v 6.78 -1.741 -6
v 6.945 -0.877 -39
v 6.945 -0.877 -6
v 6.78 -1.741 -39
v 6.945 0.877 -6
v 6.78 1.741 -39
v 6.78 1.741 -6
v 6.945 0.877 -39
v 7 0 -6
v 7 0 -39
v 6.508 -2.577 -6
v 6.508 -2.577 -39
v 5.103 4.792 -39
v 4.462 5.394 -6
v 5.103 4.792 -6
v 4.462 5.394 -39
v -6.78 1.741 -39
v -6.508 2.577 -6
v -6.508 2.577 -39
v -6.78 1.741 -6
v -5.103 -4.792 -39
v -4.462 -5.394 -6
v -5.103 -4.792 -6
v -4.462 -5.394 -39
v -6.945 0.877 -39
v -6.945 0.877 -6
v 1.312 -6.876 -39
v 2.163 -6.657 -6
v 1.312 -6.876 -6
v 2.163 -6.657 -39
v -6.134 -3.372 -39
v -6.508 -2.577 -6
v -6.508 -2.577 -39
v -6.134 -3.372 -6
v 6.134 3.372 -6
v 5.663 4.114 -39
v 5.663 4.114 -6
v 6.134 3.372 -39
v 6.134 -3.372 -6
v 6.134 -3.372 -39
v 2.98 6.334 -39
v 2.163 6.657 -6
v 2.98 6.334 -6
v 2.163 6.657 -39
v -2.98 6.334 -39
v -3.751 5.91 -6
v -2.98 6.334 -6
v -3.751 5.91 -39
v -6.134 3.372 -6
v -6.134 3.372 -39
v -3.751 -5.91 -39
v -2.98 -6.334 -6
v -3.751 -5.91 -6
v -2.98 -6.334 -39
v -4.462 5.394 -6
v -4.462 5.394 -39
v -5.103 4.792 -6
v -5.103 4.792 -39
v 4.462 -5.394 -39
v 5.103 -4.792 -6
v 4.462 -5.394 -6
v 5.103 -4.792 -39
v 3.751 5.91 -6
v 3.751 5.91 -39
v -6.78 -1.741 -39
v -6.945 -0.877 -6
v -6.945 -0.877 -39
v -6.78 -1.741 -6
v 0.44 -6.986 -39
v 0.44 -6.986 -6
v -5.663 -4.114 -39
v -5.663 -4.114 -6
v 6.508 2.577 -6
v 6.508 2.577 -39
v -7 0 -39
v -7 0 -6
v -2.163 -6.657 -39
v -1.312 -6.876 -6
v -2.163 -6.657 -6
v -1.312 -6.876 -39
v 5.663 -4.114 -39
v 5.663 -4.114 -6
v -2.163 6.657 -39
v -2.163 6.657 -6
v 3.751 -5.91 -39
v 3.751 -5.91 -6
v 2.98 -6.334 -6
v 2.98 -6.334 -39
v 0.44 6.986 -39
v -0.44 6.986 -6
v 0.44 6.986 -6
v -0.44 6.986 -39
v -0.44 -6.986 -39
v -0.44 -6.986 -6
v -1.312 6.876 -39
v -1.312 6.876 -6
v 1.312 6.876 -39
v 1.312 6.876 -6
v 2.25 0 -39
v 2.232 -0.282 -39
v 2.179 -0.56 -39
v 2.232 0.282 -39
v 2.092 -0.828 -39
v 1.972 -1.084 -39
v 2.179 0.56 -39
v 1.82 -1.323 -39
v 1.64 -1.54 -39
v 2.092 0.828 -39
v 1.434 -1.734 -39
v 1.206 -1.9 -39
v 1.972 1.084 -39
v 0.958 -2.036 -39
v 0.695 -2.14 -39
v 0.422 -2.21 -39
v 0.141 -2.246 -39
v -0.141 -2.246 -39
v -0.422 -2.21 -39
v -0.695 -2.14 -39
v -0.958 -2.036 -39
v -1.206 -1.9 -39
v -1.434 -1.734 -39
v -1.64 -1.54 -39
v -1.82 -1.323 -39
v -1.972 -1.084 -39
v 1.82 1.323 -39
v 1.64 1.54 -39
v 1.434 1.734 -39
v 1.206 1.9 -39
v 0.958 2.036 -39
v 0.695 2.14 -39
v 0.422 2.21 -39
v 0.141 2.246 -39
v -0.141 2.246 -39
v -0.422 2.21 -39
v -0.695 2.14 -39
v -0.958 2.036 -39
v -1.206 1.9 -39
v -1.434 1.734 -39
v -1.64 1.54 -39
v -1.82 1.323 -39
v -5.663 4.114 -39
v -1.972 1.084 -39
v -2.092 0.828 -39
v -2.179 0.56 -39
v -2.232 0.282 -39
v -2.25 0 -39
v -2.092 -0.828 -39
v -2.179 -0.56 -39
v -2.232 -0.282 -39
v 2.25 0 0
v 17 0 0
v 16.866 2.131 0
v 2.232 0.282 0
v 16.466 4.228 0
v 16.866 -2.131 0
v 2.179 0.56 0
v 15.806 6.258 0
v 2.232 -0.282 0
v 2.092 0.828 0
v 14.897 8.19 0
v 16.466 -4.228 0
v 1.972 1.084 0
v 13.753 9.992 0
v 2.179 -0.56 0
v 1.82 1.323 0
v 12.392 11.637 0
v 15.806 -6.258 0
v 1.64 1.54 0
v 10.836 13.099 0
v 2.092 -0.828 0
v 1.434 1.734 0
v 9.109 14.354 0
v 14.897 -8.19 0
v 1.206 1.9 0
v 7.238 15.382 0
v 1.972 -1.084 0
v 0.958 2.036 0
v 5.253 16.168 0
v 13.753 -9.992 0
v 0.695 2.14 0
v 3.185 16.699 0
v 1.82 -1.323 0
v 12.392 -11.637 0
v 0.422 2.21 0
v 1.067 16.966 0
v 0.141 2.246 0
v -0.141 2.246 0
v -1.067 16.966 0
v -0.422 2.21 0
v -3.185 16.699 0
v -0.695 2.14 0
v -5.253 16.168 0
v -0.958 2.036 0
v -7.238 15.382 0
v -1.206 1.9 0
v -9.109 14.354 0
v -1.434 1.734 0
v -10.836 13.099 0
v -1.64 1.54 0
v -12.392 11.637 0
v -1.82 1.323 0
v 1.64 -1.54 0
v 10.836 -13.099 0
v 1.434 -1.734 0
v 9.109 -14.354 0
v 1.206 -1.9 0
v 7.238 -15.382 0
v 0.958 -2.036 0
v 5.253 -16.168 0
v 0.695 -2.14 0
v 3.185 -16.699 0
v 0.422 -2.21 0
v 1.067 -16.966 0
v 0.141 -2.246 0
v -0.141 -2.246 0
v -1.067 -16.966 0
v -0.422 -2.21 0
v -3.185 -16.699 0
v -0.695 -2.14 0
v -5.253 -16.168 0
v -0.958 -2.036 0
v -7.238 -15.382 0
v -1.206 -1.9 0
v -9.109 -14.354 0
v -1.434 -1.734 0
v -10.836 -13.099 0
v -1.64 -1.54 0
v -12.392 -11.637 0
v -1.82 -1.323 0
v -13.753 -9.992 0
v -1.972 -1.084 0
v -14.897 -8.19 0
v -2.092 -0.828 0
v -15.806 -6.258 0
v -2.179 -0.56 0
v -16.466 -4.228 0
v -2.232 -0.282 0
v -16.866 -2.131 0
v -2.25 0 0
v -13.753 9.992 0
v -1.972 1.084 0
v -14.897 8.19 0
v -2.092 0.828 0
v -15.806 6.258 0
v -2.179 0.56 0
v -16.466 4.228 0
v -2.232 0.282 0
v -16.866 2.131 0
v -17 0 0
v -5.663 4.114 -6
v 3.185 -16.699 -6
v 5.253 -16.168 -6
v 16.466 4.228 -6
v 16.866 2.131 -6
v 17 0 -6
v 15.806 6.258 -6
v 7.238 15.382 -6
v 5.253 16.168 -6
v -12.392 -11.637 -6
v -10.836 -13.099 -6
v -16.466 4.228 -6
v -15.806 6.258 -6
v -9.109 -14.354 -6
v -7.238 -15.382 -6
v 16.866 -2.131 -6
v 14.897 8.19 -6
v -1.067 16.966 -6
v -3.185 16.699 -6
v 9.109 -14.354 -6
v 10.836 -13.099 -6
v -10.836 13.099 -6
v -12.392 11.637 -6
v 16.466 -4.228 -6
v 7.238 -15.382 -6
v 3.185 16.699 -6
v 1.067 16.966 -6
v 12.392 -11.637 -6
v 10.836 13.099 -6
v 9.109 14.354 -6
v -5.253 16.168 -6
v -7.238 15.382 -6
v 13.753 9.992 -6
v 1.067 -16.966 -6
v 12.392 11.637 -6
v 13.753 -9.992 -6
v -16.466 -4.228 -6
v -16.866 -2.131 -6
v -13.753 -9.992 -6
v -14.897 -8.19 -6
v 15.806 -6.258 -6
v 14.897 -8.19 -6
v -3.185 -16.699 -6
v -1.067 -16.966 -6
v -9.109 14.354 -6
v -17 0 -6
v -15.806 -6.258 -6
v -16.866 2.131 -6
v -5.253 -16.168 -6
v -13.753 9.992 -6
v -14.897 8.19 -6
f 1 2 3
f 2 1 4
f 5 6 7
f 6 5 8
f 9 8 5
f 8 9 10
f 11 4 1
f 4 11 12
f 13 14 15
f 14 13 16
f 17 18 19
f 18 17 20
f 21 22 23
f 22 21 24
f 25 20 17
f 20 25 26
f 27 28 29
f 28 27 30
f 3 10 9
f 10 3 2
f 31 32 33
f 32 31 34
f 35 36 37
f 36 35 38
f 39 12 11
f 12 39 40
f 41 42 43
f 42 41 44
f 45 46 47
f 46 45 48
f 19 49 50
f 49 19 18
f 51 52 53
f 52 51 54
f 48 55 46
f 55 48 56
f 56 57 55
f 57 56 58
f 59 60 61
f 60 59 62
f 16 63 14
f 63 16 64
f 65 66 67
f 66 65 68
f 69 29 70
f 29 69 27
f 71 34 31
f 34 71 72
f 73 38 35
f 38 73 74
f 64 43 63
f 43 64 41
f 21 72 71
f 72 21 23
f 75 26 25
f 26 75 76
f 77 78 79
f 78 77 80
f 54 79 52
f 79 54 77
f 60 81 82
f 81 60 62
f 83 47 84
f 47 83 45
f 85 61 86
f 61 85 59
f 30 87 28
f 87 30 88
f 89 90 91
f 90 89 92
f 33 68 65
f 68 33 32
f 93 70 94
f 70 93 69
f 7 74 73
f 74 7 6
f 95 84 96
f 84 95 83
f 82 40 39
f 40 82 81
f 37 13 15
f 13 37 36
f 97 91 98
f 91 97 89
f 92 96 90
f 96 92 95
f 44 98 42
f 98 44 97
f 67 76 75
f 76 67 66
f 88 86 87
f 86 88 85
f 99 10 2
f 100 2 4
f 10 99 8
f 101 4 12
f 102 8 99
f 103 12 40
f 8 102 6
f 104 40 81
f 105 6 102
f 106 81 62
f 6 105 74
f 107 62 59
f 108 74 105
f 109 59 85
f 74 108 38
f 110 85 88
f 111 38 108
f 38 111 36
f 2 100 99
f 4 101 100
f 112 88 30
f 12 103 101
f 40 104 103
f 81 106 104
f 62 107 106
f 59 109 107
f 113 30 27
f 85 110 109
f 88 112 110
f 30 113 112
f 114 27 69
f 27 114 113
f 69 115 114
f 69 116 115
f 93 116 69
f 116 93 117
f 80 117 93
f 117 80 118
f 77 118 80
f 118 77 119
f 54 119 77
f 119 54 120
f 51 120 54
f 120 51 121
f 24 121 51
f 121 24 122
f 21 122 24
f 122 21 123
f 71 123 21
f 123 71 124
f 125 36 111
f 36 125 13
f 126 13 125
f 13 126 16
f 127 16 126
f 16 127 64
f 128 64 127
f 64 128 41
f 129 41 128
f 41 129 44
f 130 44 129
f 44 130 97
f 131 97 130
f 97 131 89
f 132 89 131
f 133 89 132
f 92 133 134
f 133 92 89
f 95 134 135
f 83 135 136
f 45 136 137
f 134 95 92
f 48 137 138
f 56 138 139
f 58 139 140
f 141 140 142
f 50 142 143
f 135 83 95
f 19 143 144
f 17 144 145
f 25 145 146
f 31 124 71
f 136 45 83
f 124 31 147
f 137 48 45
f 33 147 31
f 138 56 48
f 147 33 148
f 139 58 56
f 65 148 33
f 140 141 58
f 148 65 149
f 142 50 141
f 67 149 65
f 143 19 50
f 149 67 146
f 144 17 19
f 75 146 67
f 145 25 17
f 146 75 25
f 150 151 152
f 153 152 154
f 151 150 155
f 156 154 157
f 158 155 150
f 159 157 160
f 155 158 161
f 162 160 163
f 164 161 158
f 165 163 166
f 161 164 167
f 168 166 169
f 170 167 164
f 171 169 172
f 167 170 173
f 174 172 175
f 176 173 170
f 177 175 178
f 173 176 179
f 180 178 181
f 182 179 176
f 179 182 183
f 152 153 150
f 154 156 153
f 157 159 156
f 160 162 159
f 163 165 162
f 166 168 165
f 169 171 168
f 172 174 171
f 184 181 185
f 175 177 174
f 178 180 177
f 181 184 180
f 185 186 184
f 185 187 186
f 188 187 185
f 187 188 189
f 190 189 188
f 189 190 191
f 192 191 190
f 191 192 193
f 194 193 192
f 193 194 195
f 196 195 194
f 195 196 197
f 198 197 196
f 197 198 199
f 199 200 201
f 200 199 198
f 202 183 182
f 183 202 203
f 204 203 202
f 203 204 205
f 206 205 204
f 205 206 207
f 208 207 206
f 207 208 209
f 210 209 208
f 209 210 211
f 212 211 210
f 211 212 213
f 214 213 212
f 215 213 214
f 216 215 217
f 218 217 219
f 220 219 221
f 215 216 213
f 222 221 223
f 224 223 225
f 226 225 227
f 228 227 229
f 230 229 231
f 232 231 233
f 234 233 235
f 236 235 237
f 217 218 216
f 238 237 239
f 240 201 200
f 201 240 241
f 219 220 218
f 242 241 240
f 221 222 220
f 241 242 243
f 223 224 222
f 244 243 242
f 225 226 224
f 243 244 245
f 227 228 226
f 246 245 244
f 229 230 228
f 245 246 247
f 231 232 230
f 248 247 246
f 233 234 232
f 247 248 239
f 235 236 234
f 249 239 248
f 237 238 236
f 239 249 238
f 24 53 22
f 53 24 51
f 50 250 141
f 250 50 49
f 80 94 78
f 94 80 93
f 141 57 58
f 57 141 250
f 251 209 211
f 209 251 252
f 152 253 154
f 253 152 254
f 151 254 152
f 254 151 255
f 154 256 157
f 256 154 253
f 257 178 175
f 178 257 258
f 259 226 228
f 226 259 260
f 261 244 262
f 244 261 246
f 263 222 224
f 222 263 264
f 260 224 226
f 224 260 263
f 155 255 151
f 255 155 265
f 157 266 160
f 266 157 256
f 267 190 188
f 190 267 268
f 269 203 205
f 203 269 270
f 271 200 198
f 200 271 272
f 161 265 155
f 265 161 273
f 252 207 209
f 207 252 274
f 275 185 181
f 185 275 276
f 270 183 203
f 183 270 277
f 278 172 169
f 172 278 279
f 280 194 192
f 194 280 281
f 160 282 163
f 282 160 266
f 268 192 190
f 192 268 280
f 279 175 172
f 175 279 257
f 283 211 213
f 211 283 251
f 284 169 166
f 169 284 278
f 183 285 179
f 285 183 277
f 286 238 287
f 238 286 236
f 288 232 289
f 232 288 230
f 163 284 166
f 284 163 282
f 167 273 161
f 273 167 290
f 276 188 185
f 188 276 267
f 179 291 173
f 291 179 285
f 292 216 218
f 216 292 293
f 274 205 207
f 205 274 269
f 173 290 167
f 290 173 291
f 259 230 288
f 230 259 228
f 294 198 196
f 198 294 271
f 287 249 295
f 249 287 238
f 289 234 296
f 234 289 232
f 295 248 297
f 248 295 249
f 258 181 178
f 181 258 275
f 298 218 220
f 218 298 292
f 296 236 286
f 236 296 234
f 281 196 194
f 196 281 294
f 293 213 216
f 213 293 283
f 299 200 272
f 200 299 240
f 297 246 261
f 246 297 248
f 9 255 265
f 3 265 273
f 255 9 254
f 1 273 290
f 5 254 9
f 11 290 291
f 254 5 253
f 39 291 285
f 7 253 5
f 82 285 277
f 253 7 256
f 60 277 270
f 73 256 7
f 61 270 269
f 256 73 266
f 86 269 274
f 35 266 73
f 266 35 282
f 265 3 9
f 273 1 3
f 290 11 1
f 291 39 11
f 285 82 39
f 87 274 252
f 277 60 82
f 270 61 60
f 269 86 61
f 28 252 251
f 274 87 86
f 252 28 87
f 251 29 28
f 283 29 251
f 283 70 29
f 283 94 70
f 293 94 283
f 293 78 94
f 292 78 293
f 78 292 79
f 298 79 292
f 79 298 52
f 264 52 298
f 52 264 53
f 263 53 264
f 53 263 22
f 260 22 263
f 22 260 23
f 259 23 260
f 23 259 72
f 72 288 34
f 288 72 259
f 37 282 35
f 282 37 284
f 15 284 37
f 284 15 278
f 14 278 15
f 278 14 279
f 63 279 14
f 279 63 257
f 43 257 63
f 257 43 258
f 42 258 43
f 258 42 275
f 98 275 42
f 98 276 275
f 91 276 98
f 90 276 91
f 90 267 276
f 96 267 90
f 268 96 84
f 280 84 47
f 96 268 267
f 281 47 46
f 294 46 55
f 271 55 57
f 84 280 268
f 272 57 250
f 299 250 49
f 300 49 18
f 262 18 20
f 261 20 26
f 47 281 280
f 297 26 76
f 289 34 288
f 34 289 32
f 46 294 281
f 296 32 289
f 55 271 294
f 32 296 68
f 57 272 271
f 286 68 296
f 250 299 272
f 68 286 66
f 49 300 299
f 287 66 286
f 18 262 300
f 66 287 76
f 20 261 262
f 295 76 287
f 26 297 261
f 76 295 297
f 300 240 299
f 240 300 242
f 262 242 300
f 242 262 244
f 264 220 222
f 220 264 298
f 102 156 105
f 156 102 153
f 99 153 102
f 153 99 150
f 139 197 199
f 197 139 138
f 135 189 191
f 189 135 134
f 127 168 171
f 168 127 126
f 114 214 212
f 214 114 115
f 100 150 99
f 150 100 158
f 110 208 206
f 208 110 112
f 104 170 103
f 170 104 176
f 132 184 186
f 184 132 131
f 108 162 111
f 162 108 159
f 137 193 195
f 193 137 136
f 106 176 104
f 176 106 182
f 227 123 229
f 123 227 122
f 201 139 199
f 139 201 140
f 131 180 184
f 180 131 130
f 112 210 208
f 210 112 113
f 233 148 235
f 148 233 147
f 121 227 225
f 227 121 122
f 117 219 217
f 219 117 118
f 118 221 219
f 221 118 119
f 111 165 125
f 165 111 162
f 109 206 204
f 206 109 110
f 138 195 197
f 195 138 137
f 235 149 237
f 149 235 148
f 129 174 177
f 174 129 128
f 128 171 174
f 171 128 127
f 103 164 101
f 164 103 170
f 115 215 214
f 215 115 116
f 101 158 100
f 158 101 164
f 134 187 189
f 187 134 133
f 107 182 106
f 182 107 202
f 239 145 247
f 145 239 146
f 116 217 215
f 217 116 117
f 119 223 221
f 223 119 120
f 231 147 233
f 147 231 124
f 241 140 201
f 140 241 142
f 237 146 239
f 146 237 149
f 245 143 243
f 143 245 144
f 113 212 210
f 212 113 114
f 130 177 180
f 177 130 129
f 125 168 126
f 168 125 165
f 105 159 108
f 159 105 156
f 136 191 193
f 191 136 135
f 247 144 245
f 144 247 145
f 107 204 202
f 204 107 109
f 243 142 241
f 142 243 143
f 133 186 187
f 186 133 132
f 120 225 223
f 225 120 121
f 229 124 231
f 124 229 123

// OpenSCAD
$fn = 50;


difference() {
	union() {
		translate(v = [0, 0, -39.0000000000]) {
			cylinder(h = 39, r = 7.0000000000);
		}
		translate(v = [0, 0, -6.0000000000]) {
			cylinder(h = 6, r = 17.0000000000);
		}
	}
	union() {
		#translate(v = [0, 0, -39]) {
			cylinder(h = 39, r = 2.2500000000);
		}
	}
}
